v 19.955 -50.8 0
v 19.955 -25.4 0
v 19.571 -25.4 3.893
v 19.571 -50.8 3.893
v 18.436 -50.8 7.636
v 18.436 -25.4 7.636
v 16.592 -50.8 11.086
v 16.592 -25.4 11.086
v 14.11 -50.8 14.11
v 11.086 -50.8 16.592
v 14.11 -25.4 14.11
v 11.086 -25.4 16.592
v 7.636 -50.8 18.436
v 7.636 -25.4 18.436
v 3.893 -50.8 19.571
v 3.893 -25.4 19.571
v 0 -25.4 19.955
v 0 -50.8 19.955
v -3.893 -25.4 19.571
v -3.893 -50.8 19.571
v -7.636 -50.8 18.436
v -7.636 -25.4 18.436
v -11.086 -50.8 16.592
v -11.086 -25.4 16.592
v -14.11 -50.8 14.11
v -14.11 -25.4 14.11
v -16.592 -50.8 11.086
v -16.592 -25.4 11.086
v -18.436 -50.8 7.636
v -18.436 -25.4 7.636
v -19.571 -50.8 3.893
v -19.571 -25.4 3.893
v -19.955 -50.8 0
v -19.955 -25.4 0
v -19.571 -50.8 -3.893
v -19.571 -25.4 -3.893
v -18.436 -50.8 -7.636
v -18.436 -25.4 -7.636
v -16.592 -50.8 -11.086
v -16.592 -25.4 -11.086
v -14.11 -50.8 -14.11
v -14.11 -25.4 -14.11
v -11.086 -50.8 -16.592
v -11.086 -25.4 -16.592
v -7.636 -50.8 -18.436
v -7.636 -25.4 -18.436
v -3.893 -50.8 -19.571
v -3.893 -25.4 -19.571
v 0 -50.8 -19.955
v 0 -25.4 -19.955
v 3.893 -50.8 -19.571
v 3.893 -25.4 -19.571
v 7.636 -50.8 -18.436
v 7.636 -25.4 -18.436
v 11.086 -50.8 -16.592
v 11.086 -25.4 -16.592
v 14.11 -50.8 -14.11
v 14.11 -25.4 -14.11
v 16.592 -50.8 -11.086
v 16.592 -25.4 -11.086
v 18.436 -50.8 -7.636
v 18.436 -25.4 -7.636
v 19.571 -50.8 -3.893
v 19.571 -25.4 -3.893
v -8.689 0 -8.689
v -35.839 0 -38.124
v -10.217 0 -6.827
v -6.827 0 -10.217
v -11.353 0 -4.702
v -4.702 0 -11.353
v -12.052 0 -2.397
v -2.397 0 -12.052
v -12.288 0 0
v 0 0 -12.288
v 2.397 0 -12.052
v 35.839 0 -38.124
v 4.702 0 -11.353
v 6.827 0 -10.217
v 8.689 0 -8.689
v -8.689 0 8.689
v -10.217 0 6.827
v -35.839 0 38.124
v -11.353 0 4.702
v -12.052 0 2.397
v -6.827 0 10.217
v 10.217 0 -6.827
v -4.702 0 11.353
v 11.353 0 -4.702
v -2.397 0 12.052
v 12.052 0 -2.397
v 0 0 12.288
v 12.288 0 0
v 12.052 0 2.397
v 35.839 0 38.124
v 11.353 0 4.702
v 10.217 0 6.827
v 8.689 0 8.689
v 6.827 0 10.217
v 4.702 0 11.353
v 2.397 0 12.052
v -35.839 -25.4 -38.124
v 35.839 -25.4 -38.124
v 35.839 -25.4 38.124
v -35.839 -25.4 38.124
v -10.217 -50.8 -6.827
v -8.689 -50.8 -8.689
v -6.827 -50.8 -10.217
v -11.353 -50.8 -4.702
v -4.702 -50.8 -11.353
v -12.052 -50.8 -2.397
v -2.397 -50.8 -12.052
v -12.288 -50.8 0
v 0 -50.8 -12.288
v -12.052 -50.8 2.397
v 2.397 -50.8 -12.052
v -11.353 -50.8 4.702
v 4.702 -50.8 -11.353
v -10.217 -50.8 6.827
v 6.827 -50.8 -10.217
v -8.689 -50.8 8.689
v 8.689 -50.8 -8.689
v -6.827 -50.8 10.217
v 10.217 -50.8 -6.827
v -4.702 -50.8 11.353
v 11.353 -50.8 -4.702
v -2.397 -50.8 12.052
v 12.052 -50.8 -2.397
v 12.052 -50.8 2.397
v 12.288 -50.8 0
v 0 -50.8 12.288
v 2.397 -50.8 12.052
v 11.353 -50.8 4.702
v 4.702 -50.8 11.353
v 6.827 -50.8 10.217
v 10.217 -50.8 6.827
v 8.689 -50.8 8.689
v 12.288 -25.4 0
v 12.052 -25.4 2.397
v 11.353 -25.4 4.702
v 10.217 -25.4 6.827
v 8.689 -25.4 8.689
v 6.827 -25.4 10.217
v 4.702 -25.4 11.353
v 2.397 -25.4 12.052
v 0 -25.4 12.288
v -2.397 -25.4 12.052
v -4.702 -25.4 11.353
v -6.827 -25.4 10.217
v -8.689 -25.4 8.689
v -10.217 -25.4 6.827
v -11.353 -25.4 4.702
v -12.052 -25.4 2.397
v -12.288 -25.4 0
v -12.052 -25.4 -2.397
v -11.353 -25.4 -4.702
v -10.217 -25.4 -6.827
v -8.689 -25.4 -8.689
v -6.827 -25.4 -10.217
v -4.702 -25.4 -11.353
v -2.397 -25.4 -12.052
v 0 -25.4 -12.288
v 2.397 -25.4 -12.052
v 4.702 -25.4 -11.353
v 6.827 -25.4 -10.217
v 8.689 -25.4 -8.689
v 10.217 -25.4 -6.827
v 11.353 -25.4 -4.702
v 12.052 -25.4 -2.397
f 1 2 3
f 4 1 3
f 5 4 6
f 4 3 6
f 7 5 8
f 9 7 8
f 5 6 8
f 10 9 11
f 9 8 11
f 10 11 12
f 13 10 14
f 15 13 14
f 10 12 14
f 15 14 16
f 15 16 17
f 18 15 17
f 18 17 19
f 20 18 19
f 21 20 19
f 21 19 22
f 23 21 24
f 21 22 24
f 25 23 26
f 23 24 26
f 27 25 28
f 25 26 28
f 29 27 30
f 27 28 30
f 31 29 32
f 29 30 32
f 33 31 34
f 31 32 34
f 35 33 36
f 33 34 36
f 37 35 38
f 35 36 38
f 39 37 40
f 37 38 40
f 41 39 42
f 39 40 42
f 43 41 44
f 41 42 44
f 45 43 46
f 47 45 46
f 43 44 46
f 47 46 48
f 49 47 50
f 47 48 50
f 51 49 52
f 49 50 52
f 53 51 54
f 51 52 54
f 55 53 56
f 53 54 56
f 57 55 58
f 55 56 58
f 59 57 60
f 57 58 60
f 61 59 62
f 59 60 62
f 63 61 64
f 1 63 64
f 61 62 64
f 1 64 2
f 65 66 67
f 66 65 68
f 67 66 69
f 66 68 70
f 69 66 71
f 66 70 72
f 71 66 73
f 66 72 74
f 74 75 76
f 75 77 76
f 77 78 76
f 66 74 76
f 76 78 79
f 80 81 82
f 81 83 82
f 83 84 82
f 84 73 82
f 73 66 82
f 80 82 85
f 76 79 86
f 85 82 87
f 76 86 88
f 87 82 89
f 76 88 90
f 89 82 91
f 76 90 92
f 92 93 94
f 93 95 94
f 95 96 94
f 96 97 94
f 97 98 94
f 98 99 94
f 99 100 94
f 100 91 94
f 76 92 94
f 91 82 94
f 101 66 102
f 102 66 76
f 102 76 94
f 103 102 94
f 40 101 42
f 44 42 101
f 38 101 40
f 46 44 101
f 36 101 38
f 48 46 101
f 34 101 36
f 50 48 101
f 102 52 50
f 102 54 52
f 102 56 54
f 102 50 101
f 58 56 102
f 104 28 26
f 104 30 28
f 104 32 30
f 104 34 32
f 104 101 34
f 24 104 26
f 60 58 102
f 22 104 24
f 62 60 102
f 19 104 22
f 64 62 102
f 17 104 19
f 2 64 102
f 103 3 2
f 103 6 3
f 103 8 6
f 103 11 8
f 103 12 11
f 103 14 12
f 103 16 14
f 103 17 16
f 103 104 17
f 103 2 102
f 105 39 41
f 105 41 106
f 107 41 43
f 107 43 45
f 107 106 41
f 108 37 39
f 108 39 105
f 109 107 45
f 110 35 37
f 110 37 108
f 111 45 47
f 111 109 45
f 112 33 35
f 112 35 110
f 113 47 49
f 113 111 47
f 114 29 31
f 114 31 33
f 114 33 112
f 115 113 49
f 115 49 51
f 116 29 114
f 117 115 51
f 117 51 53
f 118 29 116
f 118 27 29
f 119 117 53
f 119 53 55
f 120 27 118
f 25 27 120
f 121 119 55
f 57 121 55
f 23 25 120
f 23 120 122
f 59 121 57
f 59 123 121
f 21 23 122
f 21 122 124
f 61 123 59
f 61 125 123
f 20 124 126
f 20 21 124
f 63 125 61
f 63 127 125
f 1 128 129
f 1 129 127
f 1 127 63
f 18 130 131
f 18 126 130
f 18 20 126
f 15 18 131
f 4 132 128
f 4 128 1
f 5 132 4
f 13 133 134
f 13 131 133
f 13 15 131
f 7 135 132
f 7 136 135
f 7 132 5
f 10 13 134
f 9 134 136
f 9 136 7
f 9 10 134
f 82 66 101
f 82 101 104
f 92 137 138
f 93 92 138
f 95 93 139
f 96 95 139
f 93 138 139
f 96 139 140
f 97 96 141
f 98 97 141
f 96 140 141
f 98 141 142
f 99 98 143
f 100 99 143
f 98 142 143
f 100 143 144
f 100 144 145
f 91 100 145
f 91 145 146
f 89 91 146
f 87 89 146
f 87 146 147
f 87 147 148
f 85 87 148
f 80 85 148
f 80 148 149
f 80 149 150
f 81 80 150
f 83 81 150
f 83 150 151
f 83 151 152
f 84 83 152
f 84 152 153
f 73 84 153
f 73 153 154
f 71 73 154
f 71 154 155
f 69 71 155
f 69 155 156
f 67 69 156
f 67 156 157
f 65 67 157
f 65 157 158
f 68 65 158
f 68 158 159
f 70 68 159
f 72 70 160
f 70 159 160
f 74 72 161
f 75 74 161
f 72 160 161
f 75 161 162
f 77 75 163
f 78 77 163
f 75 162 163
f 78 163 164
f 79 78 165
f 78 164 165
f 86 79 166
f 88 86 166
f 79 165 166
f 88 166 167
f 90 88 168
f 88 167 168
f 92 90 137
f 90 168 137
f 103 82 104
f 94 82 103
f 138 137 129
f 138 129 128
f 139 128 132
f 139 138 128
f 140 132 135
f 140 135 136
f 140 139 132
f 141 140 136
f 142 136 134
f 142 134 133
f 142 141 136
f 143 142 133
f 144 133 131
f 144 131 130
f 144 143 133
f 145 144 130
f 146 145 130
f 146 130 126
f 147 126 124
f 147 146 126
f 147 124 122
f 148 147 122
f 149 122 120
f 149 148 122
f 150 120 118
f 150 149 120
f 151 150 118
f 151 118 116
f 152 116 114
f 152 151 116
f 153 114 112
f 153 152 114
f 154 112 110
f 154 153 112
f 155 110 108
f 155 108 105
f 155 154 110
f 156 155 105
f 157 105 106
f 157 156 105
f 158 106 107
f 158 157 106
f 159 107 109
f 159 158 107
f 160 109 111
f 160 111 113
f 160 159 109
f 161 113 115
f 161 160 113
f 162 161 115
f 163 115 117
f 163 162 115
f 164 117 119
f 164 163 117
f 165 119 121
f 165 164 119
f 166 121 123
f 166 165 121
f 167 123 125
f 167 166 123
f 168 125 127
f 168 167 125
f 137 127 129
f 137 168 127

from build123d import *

# Parameters (mm, degrees)
F0_W      = 71.678758
F0_H      = 76.247908
F1_DEPTH  = 25.4
F2_R      = 19.954612
F2_R_2    = 12.288069
F3_DEPTH  = 25.4
F3_FACE_R = 12.288069
F4_DEPTH  = 25.401


with BuildPart() as f1:
    # F0 (on Front) → F1 (new body)
    with BuildSketch(Plane.XZ):
        Rectangle(F0_W, F0_H)
    extrude(amount=F1_DEPTH)

    # F2 (on face) → F3 (join)
    with BuildSketch(Plane.XZ.offset(25.4)):
        Circle(F2_R)
        Circle(F2_R_2, mode=Mode.SUBTRACT)
    extrude(amount=F3_DEPTH)

    # F3_face (on face) → F4 (cut, through all)
    with BuildSketch(Plane.XZ.offset(25.4)):
        Circle(F3_FACE_R)
    extrude(amount=-F4_DEPTH, mode=Mode.SUBTRACT)


solid = f1.part
